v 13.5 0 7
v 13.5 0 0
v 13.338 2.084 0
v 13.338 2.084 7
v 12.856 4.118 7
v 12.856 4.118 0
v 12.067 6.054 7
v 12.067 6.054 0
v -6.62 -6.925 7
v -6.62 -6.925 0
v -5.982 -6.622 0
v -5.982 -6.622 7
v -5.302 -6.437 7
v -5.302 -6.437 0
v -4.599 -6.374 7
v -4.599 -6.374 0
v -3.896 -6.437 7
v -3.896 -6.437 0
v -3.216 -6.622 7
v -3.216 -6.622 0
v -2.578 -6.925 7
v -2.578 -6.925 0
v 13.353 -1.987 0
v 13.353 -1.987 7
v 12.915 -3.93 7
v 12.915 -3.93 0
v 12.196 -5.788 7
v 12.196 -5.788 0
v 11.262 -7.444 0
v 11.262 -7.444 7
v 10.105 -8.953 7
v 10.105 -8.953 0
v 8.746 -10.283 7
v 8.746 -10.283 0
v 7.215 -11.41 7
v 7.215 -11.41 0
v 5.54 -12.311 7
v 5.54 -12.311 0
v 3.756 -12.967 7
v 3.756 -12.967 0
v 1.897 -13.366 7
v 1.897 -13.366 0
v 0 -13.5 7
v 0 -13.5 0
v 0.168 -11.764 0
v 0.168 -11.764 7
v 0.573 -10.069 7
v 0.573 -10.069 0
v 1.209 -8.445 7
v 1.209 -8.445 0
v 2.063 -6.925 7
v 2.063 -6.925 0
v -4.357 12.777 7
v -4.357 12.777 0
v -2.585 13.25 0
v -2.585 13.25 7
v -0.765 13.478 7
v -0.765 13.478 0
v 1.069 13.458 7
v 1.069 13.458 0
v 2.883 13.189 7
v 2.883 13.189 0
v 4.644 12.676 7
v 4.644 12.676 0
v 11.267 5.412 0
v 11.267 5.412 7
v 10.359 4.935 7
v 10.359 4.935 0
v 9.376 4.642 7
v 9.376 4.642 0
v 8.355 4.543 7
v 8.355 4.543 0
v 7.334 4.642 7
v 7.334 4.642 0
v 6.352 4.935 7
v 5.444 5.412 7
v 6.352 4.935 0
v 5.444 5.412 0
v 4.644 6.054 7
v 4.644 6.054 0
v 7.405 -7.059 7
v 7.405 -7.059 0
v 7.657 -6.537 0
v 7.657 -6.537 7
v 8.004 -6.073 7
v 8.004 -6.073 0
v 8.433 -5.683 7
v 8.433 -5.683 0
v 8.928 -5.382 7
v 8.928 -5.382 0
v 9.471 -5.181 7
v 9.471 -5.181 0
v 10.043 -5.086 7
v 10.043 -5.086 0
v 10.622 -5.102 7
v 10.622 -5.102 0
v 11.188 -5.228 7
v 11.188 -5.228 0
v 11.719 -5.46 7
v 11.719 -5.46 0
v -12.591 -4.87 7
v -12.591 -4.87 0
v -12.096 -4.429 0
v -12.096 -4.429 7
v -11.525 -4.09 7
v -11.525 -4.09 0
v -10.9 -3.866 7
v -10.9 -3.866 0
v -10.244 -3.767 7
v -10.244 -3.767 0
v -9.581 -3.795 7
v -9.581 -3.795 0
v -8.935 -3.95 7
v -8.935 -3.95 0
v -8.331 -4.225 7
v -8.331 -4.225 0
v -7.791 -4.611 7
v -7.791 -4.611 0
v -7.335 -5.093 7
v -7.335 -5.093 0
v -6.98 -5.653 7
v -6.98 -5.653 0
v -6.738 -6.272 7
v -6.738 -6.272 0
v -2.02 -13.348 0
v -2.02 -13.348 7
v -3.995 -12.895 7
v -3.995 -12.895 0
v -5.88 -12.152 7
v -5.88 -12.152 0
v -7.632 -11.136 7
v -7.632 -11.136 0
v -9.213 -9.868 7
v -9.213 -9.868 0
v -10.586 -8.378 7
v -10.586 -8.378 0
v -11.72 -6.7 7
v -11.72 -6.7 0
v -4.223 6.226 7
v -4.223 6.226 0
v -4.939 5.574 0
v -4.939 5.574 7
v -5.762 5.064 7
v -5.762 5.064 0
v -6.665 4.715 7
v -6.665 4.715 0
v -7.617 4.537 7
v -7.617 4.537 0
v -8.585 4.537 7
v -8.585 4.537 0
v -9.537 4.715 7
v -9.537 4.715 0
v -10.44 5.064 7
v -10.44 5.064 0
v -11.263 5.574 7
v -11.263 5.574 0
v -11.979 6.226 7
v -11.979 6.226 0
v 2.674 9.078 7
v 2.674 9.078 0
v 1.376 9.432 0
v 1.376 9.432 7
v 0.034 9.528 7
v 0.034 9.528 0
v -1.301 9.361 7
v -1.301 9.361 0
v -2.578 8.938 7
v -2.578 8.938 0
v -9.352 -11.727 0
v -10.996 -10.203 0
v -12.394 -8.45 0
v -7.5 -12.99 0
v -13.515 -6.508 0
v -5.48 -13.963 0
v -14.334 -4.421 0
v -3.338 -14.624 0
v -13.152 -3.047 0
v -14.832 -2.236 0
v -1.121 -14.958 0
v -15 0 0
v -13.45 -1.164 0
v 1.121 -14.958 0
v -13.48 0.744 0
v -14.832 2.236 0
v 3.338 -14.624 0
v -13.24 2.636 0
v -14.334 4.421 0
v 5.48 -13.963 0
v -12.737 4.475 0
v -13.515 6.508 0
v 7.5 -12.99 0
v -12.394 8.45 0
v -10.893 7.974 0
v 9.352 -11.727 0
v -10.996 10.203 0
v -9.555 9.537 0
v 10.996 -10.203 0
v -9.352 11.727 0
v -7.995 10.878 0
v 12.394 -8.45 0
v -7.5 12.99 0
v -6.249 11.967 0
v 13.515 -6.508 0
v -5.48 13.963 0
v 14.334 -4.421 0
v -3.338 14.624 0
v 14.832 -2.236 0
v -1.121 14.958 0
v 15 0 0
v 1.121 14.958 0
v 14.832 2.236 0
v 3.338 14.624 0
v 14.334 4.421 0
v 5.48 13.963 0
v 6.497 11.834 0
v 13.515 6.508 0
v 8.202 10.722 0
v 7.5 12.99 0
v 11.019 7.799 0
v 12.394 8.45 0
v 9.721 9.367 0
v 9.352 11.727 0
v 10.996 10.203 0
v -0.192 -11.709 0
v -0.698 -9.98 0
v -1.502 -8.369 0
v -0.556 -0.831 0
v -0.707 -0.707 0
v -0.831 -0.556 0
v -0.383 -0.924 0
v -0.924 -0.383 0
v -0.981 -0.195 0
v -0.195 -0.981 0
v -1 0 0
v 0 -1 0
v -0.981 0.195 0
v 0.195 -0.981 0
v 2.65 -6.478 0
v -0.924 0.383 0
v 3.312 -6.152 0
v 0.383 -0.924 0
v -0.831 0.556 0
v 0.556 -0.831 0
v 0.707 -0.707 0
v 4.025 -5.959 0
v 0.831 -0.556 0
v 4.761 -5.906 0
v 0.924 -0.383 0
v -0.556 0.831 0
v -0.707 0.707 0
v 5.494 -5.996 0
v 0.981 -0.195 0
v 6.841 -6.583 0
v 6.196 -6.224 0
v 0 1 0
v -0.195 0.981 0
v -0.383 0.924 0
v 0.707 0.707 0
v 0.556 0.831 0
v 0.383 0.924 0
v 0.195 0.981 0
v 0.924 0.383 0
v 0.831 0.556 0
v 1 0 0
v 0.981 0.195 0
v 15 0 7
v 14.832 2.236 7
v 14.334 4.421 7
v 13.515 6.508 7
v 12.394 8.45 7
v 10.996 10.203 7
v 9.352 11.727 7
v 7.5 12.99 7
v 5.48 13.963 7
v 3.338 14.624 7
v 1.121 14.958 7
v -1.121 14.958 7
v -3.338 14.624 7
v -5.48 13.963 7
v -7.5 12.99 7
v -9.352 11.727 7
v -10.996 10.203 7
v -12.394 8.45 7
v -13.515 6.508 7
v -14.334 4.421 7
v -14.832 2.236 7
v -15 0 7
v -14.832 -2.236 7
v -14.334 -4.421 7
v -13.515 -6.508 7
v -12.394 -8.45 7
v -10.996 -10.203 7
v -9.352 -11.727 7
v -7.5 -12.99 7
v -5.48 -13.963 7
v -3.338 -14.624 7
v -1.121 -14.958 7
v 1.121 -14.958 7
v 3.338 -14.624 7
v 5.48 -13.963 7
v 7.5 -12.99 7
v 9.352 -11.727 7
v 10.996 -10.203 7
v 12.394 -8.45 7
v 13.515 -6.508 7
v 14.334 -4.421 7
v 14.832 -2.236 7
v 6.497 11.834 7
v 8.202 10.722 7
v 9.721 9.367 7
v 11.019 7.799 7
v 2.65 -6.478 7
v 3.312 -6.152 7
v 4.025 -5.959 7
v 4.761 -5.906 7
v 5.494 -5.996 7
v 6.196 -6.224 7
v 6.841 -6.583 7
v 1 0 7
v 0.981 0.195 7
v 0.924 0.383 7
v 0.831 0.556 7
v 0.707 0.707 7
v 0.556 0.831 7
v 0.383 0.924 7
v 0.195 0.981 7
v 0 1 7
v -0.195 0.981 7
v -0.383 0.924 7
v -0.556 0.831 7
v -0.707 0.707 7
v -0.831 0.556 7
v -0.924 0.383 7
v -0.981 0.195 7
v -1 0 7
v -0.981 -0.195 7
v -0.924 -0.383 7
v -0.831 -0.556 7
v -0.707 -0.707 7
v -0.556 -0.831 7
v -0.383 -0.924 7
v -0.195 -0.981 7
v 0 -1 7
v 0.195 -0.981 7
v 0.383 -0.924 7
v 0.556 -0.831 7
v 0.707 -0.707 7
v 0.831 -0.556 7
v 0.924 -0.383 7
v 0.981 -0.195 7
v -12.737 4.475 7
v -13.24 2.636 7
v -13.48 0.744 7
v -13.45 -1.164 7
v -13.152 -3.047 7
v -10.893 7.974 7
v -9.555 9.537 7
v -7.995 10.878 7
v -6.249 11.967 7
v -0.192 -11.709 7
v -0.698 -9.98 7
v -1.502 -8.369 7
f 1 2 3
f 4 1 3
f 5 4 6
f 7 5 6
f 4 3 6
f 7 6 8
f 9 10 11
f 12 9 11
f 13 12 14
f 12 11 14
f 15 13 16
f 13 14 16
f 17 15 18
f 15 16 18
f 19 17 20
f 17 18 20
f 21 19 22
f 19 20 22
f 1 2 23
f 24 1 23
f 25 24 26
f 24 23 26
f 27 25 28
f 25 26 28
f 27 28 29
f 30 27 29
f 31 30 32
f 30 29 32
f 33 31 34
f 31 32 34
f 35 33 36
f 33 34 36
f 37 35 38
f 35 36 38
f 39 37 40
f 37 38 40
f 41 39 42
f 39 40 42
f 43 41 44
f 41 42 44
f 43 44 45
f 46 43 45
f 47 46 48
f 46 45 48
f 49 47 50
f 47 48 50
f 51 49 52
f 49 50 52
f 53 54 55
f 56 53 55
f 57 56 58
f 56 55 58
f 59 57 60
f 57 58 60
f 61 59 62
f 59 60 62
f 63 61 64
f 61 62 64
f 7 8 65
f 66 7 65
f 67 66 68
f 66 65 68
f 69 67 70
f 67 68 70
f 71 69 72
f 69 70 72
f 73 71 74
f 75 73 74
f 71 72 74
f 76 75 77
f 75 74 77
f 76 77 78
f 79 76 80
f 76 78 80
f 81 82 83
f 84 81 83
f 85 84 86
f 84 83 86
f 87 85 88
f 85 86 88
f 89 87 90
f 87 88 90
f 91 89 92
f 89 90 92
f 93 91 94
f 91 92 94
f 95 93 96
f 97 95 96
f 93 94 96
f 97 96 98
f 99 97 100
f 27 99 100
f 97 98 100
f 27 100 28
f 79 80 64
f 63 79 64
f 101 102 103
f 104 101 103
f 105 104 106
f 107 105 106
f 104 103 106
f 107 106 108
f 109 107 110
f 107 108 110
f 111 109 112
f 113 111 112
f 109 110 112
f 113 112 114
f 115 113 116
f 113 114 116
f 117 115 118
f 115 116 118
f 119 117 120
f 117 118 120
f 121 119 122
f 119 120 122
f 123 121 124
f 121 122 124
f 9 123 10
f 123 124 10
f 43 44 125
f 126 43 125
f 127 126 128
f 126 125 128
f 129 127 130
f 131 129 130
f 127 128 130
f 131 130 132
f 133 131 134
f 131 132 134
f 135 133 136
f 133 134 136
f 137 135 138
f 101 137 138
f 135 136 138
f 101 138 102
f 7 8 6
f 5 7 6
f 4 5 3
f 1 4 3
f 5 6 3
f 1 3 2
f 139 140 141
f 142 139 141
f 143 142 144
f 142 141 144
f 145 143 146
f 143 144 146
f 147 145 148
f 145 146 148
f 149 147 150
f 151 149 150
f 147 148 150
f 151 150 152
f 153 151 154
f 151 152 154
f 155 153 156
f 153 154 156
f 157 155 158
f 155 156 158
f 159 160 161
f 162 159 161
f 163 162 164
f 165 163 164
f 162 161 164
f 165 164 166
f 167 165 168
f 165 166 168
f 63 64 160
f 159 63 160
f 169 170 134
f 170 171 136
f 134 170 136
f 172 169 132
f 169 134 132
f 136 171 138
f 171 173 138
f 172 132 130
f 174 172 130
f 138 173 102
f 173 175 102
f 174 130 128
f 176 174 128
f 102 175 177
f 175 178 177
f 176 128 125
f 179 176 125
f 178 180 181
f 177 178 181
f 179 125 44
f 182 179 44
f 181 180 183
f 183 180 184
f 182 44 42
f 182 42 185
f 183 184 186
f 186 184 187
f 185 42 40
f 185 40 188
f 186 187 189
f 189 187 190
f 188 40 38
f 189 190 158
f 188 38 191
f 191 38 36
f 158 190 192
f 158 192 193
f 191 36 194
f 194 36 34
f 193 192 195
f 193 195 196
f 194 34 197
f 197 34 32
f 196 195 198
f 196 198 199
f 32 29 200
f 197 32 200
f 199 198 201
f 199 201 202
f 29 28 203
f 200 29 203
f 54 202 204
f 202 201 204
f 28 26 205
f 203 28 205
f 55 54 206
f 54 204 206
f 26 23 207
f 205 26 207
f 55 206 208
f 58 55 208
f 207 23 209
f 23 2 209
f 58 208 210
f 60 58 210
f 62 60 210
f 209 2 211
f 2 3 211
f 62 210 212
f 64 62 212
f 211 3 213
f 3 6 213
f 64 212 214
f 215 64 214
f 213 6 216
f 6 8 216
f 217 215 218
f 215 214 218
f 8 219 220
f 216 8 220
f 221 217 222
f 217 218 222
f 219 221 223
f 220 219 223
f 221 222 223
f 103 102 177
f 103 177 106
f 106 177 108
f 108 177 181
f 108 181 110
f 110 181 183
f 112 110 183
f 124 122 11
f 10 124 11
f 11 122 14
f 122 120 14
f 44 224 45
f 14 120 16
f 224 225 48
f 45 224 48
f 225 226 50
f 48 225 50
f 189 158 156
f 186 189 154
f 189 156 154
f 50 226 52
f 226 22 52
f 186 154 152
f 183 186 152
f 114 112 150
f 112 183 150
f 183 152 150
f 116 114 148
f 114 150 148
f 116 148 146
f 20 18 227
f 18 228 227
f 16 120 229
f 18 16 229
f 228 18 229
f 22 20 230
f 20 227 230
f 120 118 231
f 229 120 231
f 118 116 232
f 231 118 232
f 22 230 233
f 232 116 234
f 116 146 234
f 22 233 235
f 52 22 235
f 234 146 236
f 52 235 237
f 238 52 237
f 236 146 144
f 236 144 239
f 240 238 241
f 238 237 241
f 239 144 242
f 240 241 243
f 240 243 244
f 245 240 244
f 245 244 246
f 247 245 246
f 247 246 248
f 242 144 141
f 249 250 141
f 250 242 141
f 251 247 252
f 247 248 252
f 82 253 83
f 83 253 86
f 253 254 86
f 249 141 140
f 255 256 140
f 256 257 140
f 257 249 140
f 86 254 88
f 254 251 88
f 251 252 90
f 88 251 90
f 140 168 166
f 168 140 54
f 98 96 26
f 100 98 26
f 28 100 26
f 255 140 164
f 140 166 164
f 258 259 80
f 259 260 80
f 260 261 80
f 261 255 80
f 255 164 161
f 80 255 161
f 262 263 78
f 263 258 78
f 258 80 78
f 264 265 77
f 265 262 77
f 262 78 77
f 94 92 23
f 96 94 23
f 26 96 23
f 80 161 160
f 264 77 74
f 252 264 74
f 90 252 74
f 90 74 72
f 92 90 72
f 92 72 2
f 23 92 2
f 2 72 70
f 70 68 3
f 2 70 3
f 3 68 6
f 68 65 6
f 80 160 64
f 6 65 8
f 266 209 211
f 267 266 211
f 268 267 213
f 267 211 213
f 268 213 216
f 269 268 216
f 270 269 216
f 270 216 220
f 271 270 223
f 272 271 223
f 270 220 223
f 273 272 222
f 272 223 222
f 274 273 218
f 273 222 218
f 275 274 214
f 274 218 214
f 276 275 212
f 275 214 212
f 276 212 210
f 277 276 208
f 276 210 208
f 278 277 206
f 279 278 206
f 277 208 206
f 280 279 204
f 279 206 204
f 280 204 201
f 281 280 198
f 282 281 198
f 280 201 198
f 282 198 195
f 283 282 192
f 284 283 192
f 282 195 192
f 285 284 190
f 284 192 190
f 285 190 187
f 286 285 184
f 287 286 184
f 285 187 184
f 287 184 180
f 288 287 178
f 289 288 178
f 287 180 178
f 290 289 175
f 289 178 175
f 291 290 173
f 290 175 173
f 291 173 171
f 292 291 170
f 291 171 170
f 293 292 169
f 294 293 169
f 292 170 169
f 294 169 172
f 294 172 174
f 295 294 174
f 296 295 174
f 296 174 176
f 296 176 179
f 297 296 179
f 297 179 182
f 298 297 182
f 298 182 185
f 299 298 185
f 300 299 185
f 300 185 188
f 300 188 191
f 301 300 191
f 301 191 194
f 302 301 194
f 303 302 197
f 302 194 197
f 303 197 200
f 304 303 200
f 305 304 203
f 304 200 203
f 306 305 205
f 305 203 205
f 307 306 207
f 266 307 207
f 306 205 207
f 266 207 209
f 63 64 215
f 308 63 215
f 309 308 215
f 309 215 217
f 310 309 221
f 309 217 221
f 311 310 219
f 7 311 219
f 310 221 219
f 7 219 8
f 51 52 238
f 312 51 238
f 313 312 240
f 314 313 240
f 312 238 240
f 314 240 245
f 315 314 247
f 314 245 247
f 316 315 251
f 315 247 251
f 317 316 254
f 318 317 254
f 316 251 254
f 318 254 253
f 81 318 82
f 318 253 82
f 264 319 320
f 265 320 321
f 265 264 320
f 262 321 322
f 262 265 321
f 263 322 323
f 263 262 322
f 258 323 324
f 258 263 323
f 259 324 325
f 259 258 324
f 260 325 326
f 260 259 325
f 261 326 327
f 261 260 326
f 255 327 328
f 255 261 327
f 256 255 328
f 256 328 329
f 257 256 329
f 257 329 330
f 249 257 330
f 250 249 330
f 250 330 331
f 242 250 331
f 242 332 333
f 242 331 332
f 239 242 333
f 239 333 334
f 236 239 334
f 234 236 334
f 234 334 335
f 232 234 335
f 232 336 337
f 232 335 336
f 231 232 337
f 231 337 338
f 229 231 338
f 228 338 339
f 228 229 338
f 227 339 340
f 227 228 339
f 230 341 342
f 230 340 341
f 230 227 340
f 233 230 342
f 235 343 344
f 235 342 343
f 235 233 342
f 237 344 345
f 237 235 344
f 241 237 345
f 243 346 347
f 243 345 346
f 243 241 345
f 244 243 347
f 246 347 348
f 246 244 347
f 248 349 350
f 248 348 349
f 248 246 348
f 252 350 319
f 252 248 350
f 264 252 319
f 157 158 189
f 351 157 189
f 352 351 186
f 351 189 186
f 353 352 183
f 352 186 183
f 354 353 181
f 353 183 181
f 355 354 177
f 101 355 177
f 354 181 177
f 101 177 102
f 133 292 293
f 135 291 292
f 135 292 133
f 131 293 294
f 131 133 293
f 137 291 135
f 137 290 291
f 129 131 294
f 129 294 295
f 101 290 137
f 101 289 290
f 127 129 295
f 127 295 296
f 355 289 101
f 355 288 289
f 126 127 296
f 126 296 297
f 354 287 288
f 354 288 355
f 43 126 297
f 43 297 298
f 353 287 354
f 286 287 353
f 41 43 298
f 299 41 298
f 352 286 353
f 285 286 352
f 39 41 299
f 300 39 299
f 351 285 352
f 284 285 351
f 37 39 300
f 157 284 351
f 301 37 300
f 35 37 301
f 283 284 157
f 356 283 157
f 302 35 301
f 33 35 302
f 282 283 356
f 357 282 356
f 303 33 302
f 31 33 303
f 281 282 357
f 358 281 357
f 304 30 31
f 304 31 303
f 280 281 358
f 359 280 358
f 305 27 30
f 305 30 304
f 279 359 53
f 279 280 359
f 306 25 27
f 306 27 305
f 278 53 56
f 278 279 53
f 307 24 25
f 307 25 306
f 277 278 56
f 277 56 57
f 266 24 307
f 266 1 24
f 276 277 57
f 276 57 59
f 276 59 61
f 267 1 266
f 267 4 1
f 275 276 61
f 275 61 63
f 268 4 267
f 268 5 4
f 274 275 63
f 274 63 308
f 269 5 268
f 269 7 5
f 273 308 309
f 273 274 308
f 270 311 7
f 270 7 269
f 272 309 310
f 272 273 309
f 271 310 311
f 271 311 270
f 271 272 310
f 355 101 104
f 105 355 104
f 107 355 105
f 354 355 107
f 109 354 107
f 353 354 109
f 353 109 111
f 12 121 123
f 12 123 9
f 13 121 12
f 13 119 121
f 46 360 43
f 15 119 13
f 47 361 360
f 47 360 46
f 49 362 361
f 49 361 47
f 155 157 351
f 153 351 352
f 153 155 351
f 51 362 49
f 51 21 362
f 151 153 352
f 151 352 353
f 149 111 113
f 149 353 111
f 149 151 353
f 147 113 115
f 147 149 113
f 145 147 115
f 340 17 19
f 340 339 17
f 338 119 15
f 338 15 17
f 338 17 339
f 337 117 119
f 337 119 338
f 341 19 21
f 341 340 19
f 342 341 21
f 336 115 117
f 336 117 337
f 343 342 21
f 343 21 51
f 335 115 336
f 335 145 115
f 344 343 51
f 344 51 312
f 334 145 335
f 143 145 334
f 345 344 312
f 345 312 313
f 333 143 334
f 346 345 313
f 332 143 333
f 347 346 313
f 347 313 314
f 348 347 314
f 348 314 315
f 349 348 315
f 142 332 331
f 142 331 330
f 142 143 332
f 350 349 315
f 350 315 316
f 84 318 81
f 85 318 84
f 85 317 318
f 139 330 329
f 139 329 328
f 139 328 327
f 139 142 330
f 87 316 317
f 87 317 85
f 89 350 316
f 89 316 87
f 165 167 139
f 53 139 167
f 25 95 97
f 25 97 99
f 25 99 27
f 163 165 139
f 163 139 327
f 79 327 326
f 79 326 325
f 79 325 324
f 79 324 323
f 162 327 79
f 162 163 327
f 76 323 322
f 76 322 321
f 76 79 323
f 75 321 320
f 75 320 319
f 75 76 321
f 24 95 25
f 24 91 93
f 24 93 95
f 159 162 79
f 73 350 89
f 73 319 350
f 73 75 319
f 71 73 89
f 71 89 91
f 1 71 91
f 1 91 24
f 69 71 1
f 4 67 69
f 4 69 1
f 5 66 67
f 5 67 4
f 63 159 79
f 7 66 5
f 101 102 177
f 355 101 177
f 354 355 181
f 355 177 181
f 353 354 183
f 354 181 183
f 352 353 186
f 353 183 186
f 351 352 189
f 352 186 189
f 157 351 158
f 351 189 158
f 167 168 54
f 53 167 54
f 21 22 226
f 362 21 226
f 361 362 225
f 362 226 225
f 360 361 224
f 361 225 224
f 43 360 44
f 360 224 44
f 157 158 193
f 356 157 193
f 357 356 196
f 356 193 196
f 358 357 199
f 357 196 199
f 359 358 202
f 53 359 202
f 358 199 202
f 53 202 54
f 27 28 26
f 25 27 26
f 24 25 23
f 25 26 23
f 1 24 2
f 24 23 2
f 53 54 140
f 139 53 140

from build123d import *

# Parameters (mm, degrees)
F0_R     = 15
F1_DEPTH = 7
F2_DEPTH = 7
F3_R     = 1
F4_DEPTH = 7.001


with BuildPart() as f1:
    # F0 (on Top) → F1 (new body)
    with BuildSketch(Plane.XY):
        Circle(F0_R)
        with BuildLine():
            ThreePointArc((12.06655, 6.05379), (13.13675, 3.110593), (13.5, 0))
            ThreePointArc((13.5, 0), (13.170032, -2.966524), (12.196257, -5.788032))
            ThreePointArc((12.196257, -5.788032), (7.21497, -11.410268), (0, -13.5))
            ThreePointArc((0, -13.5), (-7.632164, -11.135532), (-12.590845, -4.870382))
            ThreePointArc((-12.590845, -4.870382), (-13.479509, 0.743526), (-11.978791, 6.225637))
            ThreePointArc((-11.978791, 6.225637), (-8.800548, 10.237204), (-4.357446, 12.777428))
            ThreePointArc((-4.357446, 12.777428), (0.151972, 13.499145), (4.643998, 12.676091))
            ThreePointArc((4.643998, 12.676091), (8.987454, 10.073514), (12.06655, 6.05379))
        make_face(mode=Mode.SUBTRACT)
    extrude(amount=F1_DEPTH)


with BuildPart() as f2:
    # F0 (on Top) → F2 (new body)
    with BuildSketch(Plane.XY):
        with BuildLine():
            ThreePointArc((12.196257, -5.788032), (13.170032, -2.966524), (13.5, 0))
            ThreePointArc((13.5, 0), (13.13675, 3.110593), (12.06655, 6.05379))
            ThreePointArc((12.06655, 6.05379), (8.355274, 4.542886), (4.643998, 6.05379))
            Line((4.643998, 6.05379), (4.643998, 12.676091))
            Line((4.643998, 12.676091), (2.673639, 9.077852))
            ThreePointArc((2.673639, 9.077852), (0.033808, 9.527702), (-2.578313, 8.937872))
            Line((-2.578313, 8.937872), (-4.357446, 12.777428))
            Line((-4.357446, 12.777428), (-4.223439, 6.225637))
            ThreePointArc((-4.223439, 6.225637), (-8.101115, 4.514355), (-11.978791, 6.225637))
            ThreePointArc((-11.978791, 6.225637), (-13.479509, 0.743526), (-12.590845, -4.870382))
            ThreePointArc((-12.590845, -4.870382), (-8.935145, -3.949587), (-6.619819, -6.924696))
            ThreePointArc((-6.619819, -6.924696), (-4.599066, -6.374414), (-2.578313, -6.924696))
            ThreePointArc((-2.578313, -6.924696), (-0.697832, -9.980478), (0, -13.5))
            ThreePointArc((0, -13.5), (0.573261, -10.068685), (2.062518, -6.924696))
            ThreePointArc((2.062518, -6.924696), (4.761095, -5.906272), (7.405134, -7.058906))
            ThreePointArc((7.405134, -7.058906), (9.470995, -5.180517), (12.196257, -5.788032))
        make_face()
    extrude(amount=F2_DEPTH)

    # F3 (on Top) → F4 (cut, through all)
    with BuildSketch(Plane.XY):
        Circle(F3_R)
    extrude(amount=F4_DEPTH, mode=Mode.SUBTRACT)


solid = Compound([f1.part, f2.part])
